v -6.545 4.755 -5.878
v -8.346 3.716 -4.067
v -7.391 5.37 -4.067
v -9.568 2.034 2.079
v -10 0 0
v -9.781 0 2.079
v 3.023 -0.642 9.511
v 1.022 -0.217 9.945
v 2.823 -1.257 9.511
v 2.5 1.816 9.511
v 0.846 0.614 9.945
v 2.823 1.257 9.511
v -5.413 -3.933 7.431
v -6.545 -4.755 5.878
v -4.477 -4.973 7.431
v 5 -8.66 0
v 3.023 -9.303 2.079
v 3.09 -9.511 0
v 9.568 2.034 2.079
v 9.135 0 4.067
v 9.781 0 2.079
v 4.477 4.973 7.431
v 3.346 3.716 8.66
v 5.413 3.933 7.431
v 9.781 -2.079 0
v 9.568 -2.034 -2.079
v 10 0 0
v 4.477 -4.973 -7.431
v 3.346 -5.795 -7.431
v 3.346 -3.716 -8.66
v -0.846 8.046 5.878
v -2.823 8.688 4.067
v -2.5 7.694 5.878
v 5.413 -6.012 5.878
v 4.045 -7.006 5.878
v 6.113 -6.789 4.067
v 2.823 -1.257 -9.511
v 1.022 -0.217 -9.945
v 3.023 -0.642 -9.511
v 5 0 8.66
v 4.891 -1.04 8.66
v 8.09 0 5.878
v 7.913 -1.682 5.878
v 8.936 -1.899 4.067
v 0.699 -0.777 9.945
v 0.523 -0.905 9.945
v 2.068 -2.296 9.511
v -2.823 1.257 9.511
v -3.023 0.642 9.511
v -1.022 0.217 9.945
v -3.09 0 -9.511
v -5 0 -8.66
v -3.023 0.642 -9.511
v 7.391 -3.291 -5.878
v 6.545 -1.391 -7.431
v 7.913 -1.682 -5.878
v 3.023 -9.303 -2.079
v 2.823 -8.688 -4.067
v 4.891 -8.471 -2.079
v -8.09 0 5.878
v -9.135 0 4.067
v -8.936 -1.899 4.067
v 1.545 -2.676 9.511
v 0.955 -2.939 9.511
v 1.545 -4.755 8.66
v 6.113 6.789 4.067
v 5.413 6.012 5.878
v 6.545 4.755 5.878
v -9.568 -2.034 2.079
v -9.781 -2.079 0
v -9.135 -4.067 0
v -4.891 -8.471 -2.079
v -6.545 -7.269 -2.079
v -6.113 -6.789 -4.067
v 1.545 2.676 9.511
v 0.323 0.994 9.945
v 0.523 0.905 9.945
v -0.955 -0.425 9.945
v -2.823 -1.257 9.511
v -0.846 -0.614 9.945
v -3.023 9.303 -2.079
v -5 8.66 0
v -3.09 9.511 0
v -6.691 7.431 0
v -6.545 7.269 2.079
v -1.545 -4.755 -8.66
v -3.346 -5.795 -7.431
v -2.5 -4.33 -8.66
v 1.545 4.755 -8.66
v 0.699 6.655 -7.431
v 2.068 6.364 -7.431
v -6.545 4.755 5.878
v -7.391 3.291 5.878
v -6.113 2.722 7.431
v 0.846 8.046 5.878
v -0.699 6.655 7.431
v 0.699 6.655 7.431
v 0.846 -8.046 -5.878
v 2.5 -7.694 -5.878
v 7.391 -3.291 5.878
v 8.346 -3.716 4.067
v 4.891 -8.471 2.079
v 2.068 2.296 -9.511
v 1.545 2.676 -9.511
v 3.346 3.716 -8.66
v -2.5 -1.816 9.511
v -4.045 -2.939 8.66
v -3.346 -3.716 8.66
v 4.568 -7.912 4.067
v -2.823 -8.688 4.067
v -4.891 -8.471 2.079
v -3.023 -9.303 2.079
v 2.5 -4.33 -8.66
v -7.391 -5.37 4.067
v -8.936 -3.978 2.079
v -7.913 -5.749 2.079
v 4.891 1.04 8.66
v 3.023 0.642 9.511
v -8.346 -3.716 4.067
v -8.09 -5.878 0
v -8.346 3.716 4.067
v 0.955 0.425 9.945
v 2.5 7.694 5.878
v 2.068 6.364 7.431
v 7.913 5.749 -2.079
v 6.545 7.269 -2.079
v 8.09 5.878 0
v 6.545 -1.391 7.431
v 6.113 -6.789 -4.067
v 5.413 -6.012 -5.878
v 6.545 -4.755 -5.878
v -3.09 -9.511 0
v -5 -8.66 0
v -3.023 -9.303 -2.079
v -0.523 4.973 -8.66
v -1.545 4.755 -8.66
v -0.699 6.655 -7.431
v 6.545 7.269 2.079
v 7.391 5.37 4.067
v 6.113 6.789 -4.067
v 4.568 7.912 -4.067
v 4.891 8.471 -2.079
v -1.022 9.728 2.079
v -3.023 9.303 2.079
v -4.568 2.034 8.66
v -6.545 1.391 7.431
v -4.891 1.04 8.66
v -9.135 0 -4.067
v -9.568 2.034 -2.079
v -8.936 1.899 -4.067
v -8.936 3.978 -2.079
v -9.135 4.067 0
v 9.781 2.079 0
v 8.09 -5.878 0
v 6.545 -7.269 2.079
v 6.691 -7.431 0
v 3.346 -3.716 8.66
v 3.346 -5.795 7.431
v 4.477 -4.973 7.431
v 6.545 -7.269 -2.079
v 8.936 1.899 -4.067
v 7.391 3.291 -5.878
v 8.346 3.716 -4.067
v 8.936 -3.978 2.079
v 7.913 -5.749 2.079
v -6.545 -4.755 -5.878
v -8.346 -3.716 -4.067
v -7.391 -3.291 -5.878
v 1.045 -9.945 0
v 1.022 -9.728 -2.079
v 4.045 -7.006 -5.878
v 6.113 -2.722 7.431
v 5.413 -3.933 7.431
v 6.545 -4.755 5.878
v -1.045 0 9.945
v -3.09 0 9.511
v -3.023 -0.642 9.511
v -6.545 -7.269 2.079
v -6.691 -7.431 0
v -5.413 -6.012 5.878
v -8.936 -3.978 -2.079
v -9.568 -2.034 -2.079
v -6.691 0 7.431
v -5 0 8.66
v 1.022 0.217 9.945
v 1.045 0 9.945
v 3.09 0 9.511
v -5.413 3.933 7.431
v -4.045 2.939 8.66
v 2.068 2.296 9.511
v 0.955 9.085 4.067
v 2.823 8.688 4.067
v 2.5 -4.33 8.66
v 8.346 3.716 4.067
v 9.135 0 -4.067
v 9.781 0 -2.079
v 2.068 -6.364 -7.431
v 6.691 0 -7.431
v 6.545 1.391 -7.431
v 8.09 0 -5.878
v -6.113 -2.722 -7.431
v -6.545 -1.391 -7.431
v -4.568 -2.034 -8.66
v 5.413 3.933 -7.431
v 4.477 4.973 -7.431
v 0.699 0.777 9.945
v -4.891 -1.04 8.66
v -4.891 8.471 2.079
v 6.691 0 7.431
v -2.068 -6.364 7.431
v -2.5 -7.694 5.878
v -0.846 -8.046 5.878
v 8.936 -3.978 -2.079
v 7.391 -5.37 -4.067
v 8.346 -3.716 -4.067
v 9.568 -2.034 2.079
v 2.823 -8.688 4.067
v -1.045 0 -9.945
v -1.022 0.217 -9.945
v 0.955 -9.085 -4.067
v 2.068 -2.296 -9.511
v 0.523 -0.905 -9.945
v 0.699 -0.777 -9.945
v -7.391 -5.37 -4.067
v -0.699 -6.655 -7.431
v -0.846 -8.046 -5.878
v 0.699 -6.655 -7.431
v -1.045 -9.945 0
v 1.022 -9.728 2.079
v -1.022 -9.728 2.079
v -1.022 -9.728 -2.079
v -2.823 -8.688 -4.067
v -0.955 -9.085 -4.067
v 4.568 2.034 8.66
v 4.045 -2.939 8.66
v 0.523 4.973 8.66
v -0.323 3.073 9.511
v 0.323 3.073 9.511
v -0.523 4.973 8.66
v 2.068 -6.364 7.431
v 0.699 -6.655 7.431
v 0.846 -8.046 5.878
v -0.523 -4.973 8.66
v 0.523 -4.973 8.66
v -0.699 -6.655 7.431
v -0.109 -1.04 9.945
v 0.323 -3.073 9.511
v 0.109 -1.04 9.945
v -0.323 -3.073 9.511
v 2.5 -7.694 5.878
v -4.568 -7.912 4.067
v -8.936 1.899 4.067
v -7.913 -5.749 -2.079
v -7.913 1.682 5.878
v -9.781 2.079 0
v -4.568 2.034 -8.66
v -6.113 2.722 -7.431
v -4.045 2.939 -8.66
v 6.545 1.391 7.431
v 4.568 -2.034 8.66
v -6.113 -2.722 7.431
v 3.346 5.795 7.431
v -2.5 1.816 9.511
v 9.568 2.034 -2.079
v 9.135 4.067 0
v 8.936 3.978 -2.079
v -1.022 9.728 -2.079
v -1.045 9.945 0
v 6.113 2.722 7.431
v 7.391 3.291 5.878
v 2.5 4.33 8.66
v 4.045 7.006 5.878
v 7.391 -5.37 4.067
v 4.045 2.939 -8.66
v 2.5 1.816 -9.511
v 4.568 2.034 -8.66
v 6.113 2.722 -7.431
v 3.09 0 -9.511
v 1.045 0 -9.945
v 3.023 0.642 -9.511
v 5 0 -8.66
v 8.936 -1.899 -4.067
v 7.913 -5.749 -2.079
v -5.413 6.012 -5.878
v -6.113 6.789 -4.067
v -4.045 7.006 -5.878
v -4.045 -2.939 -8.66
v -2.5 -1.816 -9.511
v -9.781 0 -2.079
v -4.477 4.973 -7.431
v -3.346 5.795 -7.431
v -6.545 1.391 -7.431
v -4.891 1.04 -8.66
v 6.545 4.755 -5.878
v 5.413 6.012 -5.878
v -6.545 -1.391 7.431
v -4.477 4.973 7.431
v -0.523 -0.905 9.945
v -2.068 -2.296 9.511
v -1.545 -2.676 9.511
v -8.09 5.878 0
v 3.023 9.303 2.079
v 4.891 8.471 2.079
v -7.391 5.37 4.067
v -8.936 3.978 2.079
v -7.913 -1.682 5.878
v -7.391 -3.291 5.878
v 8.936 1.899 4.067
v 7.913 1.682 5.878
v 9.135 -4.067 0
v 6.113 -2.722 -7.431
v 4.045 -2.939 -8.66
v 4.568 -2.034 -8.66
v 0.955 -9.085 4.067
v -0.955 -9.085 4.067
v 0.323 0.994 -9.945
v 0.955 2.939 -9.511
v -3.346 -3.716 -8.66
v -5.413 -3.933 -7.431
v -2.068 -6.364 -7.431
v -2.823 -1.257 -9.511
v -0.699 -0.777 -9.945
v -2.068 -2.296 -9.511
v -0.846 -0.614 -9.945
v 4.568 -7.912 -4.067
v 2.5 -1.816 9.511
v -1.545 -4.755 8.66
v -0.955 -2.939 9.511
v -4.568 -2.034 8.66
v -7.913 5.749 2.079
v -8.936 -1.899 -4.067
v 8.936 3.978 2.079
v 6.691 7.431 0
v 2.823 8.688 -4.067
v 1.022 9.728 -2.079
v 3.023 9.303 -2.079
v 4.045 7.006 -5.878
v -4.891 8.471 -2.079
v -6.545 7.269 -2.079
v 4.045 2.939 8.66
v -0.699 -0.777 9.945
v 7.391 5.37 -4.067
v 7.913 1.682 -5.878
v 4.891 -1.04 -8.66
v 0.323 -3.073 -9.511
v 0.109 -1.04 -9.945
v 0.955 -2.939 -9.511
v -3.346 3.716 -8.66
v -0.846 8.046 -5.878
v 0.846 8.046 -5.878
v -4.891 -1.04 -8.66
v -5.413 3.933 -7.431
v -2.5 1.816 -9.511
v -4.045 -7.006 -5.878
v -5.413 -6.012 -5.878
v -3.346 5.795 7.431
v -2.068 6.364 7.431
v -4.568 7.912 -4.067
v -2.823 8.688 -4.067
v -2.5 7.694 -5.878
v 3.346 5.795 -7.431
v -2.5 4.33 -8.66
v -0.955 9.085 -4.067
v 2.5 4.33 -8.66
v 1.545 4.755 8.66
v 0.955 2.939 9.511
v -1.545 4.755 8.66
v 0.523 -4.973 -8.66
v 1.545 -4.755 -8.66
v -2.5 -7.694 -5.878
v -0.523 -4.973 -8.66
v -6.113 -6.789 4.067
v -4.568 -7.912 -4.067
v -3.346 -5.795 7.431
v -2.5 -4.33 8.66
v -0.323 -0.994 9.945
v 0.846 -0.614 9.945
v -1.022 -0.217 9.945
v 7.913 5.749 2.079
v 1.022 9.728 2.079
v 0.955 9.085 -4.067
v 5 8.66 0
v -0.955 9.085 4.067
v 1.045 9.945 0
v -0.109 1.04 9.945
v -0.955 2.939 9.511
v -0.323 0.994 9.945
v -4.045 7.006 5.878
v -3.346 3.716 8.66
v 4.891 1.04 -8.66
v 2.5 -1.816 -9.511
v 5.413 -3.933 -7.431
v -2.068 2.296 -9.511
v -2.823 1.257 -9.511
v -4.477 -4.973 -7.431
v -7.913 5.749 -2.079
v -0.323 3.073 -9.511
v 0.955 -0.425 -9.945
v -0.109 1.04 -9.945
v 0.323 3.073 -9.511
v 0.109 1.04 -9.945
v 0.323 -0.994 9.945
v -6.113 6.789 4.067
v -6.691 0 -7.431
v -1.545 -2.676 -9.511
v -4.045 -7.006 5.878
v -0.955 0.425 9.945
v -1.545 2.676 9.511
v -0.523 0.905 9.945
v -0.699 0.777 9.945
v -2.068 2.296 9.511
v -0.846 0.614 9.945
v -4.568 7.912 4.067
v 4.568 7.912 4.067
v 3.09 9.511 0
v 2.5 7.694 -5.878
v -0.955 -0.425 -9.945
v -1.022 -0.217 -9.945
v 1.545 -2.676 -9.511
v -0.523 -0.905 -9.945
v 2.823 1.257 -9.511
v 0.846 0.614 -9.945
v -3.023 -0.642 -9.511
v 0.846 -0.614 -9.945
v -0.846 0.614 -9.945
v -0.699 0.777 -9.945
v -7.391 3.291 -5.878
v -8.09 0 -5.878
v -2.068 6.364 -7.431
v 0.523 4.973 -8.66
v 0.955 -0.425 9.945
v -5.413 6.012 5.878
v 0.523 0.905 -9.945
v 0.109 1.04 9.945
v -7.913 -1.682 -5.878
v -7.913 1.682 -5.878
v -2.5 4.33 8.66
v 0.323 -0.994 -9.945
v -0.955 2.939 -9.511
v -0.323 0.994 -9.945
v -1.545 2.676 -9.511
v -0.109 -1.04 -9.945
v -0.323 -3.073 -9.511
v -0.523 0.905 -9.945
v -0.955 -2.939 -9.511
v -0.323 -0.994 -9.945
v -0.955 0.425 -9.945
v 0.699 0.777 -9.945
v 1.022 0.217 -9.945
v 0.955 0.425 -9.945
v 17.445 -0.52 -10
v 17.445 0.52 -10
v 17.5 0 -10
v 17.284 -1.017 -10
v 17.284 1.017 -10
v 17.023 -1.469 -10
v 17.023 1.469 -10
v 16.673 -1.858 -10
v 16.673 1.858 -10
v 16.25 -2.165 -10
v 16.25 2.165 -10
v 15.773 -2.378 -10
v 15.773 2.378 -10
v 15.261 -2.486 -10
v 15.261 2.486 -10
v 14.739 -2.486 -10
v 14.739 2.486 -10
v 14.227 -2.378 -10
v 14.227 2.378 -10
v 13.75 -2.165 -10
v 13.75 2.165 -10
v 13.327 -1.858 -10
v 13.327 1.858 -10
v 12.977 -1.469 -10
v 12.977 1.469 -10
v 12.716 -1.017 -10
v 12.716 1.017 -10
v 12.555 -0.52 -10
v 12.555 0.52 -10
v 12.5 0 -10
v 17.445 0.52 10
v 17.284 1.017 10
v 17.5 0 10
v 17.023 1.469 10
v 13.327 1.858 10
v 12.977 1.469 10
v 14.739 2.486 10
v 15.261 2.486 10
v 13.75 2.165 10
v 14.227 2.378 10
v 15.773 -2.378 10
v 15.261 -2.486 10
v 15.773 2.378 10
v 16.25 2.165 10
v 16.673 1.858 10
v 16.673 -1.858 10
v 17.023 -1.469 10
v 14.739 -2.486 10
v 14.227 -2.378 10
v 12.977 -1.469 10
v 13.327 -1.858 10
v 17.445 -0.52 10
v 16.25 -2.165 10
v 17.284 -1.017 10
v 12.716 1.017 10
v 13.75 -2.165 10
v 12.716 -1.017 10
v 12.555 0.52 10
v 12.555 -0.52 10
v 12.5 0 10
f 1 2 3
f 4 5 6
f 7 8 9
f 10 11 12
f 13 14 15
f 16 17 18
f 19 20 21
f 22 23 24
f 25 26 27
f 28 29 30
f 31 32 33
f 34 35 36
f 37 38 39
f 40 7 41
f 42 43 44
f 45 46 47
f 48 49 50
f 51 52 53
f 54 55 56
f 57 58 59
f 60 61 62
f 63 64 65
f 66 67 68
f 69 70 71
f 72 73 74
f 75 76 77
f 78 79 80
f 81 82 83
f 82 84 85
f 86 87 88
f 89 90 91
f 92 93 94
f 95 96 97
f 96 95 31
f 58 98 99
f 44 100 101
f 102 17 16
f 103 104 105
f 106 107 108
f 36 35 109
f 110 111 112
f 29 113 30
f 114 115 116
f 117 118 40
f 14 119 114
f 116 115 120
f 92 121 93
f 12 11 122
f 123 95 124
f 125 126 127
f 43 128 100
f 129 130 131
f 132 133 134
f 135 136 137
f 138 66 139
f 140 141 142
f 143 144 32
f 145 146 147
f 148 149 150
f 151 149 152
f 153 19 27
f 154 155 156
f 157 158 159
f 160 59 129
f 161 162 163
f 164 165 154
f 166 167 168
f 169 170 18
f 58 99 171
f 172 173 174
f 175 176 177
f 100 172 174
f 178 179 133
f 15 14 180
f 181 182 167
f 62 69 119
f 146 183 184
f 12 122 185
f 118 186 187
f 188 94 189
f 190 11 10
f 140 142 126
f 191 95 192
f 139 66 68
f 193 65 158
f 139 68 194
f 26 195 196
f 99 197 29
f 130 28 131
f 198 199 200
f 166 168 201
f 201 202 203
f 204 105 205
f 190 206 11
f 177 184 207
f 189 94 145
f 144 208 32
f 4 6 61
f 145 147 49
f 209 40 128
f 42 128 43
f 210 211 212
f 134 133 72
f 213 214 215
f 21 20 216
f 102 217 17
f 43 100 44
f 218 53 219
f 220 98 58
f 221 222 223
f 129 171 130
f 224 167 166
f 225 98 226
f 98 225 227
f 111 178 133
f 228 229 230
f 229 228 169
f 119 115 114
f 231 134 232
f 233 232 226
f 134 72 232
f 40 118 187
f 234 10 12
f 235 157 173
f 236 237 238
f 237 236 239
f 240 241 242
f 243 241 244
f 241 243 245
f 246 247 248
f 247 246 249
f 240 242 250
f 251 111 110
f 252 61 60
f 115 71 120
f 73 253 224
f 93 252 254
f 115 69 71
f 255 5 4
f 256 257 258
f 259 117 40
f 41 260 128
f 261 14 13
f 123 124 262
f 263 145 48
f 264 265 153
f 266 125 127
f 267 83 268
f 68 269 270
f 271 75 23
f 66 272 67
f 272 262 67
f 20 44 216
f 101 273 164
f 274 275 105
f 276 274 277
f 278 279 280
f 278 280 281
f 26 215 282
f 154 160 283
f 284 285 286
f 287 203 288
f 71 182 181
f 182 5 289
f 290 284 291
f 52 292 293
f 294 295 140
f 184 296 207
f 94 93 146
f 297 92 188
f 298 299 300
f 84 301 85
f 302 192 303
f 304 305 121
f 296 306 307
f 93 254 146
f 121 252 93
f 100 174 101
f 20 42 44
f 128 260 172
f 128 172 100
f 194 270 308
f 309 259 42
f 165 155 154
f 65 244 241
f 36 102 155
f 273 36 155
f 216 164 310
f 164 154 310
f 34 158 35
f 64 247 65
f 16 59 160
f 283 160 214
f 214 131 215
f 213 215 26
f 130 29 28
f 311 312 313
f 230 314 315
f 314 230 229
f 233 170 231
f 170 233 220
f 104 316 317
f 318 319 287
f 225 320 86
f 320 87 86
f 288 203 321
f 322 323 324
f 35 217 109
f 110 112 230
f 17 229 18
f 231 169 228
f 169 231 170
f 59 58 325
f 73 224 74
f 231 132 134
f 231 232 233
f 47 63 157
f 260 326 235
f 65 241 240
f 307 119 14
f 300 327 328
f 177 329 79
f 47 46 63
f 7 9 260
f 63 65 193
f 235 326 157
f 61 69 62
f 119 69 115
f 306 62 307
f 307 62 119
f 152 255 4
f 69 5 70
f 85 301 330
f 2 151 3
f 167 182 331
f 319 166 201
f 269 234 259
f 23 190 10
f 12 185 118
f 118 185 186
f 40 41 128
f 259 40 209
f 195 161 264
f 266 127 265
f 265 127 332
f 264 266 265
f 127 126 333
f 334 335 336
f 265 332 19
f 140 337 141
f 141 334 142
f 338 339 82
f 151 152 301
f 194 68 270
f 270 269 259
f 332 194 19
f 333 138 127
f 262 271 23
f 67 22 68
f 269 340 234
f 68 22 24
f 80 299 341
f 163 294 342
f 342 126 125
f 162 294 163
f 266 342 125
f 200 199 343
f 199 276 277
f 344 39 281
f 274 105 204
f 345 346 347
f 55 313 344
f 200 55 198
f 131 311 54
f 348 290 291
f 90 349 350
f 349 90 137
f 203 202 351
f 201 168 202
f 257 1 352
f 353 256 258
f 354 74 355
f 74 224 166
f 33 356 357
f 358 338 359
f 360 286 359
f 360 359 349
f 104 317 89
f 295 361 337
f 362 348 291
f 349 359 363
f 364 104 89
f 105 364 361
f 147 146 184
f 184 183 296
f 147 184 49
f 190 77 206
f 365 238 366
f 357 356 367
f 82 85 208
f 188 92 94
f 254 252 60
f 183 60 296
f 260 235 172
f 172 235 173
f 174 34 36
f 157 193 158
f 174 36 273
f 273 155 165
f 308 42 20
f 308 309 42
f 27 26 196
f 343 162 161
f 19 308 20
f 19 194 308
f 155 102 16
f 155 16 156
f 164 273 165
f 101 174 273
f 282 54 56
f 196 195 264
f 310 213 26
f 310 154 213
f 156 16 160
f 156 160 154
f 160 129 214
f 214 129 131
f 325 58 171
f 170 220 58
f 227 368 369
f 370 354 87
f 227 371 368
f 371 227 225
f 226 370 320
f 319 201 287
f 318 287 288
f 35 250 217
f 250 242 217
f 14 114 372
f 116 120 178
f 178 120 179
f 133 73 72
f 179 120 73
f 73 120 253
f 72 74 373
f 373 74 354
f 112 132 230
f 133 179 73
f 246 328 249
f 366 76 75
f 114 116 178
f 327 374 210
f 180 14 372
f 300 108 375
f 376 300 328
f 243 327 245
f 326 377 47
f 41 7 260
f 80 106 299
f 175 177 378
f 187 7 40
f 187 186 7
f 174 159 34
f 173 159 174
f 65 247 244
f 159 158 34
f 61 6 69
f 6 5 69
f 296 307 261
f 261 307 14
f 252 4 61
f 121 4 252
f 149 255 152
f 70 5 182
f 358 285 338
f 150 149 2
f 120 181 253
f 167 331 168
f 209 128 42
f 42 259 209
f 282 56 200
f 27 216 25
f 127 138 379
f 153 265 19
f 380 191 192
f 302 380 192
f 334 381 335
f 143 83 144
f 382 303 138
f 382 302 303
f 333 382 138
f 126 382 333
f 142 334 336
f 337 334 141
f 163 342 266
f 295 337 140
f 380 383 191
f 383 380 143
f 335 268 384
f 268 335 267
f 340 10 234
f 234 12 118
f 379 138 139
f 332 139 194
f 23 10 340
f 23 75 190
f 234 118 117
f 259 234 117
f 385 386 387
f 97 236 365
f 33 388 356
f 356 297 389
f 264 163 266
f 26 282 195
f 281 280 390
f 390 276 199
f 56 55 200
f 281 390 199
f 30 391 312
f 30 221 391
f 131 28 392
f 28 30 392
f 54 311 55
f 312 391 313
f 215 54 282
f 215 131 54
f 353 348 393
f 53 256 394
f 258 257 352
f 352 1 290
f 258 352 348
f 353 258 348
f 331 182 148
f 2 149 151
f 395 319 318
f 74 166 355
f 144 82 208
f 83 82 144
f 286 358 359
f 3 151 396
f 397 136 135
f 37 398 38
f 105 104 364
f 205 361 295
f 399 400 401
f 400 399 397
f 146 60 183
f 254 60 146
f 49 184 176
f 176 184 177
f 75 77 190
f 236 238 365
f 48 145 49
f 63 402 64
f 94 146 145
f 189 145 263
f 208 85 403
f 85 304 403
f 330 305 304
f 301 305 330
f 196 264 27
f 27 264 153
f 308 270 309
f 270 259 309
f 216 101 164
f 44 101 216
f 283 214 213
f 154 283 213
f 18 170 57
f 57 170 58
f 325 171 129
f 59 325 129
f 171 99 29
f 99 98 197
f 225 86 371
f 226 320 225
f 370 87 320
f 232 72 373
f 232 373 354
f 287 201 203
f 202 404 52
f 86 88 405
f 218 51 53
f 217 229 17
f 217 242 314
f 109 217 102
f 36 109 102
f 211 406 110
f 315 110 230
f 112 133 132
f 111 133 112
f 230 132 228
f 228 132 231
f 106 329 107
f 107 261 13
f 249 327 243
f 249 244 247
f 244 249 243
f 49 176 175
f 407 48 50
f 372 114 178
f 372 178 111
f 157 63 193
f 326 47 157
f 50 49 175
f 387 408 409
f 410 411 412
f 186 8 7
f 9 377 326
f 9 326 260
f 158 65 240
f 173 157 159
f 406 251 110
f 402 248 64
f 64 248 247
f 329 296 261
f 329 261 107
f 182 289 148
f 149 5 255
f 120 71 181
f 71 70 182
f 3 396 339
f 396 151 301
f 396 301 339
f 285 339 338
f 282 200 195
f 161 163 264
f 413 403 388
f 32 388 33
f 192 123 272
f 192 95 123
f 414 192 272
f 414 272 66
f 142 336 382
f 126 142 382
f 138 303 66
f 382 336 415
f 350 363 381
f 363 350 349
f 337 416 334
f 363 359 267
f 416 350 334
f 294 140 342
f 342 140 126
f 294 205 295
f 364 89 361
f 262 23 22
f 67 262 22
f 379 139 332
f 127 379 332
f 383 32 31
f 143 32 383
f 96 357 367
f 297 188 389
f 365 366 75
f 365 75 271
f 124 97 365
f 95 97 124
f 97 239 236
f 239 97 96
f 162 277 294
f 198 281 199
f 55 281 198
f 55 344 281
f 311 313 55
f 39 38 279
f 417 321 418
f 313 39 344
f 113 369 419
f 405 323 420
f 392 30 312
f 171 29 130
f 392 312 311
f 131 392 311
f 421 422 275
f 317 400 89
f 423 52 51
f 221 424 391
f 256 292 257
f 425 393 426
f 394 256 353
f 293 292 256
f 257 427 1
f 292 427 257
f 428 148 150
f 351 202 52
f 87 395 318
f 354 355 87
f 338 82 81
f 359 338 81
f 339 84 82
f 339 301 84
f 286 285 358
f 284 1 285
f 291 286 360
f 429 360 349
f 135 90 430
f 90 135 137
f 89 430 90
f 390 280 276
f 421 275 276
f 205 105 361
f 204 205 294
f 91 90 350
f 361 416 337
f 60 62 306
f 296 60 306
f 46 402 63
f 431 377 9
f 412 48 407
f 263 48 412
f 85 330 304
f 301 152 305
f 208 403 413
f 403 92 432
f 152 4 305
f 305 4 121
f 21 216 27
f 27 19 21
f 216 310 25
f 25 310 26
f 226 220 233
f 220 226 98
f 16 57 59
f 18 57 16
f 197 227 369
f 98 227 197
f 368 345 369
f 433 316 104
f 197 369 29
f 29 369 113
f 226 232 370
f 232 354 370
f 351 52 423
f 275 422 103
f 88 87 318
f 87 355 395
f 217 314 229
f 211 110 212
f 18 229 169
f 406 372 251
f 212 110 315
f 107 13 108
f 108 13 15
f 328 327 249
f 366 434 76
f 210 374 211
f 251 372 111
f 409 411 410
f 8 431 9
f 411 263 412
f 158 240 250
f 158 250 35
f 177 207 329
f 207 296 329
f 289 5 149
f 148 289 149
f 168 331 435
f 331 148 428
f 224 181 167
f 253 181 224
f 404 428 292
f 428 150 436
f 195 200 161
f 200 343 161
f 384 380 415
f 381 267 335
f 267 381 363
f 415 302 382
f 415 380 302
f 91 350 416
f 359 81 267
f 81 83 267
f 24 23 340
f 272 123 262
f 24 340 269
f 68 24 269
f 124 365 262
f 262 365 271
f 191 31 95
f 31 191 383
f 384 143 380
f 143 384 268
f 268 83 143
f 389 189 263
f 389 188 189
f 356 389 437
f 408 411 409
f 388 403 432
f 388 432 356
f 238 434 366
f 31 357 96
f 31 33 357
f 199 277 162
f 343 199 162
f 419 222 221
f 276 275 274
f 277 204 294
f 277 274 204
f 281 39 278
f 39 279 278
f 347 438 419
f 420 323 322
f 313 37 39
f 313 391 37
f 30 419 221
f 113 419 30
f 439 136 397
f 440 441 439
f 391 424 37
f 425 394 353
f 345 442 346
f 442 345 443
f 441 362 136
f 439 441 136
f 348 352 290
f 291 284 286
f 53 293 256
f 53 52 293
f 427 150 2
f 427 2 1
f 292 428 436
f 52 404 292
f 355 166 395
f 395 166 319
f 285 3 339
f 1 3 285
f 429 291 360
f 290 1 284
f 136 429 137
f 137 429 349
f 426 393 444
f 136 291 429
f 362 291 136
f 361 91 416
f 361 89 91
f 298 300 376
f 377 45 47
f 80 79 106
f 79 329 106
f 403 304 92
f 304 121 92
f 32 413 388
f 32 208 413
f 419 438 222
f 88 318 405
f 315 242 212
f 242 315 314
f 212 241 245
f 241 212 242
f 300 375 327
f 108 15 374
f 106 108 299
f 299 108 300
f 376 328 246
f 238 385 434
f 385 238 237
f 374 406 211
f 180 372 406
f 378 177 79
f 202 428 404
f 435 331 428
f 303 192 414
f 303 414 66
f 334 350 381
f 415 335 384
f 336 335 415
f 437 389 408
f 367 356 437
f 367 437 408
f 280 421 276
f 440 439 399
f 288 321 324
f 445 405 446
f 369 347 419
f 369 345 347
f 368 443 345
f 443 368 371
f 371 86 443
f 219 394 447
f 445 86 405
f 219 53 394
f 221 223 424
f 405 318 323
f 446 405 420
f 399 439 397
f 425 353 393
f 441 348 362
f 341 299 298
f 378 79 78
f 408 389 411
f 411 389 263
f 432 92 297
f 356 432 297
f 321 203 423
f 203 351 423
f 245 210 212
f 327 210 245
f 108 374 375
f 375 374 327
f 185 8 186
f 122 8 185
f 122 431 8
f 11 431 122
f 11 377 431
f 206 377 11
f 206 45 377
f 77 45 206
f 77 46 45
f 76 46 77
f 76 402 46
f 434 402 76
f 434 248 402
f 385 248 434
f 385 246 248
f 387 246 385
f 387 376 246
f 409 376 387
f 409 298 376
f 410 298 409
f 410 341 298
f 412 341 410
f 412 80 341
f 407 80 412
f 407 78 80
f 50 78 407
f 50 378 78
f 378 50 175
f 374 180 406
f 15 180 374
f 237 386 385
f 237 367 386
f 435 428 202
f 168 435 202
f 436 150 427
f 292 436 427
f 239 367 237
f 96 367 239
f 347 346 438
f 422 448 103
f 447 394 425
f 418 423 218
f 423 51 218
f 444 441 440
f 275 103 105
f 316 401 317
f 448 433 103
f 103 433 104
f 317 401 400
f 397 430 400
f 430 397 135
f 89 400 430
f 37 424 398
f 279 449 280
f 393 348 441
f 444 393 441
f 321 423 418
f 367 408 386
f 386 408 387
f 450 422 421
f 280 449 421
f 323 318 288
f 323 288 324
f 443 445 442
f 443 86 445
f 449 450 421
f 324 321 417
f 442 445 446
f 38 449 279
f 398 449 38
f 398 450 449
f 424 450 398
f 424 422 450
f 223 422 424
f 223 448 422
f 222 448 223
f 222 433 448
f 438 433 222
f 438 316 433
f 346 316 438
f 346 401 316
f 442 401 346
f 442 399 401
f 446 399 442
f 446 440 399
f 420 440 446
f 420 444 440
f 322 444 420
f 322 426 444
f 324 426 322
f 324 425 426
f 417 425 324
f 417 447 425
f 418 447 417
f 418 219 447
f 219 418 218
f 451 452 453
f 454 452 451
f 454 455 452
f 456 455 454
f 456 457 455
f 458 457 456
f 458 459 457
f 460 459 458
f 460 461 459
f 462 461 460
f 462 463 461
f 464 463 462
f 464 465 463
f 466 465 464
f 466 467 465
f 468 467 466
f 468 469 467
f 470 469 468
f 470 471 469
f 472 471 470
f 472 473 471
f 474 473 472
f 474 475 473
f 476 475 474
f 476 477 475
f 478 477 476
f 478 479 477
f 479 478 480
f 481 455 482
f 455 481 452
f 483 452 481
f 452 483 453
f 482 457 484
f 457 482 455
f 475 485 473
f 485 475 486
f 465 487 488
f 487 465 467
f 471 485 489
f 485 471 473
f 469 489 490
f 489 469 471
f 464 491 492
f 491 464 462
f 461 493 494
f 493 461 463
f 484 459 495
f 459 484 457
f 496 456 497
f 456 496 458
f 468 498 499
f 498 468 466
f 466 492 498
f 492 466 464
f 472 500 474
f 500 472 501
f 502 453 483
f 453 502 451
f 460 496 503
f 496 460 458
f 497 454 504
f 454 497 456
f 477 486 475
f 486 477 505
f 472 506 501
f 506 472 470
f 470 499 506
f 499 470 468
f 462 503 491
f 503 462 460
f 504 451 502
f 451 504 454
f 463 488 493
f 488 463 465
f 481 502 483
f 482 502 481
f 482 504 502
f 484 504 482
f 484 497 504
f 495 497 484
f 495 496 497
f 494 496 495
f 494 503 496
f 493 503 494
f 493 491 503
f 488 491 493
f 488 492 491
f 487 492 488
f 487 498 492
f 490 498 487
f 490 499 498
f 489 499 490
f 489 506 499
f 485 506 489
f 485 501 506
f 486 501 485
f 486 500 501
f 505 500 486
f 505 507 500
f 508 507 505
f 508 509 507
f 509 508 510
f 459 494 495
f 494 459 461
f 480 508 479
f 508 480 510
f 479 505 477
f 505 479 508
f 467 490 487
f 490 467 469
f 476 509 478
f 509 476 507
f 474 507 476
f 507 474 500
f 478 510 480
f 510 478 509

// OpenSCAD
//Programm Module über true/false auswählen

kugel=true;
zylinder=true;
kegel=false;


$fn=30;
if (kugel){
sphere(10);}

if (zylinder){
translate([15,0,-10]) cylinder(h=20, d=5);}

if (kegel){
translate([-15,0,-10]) cylinder(h=20, d1=5, d2=0);}
